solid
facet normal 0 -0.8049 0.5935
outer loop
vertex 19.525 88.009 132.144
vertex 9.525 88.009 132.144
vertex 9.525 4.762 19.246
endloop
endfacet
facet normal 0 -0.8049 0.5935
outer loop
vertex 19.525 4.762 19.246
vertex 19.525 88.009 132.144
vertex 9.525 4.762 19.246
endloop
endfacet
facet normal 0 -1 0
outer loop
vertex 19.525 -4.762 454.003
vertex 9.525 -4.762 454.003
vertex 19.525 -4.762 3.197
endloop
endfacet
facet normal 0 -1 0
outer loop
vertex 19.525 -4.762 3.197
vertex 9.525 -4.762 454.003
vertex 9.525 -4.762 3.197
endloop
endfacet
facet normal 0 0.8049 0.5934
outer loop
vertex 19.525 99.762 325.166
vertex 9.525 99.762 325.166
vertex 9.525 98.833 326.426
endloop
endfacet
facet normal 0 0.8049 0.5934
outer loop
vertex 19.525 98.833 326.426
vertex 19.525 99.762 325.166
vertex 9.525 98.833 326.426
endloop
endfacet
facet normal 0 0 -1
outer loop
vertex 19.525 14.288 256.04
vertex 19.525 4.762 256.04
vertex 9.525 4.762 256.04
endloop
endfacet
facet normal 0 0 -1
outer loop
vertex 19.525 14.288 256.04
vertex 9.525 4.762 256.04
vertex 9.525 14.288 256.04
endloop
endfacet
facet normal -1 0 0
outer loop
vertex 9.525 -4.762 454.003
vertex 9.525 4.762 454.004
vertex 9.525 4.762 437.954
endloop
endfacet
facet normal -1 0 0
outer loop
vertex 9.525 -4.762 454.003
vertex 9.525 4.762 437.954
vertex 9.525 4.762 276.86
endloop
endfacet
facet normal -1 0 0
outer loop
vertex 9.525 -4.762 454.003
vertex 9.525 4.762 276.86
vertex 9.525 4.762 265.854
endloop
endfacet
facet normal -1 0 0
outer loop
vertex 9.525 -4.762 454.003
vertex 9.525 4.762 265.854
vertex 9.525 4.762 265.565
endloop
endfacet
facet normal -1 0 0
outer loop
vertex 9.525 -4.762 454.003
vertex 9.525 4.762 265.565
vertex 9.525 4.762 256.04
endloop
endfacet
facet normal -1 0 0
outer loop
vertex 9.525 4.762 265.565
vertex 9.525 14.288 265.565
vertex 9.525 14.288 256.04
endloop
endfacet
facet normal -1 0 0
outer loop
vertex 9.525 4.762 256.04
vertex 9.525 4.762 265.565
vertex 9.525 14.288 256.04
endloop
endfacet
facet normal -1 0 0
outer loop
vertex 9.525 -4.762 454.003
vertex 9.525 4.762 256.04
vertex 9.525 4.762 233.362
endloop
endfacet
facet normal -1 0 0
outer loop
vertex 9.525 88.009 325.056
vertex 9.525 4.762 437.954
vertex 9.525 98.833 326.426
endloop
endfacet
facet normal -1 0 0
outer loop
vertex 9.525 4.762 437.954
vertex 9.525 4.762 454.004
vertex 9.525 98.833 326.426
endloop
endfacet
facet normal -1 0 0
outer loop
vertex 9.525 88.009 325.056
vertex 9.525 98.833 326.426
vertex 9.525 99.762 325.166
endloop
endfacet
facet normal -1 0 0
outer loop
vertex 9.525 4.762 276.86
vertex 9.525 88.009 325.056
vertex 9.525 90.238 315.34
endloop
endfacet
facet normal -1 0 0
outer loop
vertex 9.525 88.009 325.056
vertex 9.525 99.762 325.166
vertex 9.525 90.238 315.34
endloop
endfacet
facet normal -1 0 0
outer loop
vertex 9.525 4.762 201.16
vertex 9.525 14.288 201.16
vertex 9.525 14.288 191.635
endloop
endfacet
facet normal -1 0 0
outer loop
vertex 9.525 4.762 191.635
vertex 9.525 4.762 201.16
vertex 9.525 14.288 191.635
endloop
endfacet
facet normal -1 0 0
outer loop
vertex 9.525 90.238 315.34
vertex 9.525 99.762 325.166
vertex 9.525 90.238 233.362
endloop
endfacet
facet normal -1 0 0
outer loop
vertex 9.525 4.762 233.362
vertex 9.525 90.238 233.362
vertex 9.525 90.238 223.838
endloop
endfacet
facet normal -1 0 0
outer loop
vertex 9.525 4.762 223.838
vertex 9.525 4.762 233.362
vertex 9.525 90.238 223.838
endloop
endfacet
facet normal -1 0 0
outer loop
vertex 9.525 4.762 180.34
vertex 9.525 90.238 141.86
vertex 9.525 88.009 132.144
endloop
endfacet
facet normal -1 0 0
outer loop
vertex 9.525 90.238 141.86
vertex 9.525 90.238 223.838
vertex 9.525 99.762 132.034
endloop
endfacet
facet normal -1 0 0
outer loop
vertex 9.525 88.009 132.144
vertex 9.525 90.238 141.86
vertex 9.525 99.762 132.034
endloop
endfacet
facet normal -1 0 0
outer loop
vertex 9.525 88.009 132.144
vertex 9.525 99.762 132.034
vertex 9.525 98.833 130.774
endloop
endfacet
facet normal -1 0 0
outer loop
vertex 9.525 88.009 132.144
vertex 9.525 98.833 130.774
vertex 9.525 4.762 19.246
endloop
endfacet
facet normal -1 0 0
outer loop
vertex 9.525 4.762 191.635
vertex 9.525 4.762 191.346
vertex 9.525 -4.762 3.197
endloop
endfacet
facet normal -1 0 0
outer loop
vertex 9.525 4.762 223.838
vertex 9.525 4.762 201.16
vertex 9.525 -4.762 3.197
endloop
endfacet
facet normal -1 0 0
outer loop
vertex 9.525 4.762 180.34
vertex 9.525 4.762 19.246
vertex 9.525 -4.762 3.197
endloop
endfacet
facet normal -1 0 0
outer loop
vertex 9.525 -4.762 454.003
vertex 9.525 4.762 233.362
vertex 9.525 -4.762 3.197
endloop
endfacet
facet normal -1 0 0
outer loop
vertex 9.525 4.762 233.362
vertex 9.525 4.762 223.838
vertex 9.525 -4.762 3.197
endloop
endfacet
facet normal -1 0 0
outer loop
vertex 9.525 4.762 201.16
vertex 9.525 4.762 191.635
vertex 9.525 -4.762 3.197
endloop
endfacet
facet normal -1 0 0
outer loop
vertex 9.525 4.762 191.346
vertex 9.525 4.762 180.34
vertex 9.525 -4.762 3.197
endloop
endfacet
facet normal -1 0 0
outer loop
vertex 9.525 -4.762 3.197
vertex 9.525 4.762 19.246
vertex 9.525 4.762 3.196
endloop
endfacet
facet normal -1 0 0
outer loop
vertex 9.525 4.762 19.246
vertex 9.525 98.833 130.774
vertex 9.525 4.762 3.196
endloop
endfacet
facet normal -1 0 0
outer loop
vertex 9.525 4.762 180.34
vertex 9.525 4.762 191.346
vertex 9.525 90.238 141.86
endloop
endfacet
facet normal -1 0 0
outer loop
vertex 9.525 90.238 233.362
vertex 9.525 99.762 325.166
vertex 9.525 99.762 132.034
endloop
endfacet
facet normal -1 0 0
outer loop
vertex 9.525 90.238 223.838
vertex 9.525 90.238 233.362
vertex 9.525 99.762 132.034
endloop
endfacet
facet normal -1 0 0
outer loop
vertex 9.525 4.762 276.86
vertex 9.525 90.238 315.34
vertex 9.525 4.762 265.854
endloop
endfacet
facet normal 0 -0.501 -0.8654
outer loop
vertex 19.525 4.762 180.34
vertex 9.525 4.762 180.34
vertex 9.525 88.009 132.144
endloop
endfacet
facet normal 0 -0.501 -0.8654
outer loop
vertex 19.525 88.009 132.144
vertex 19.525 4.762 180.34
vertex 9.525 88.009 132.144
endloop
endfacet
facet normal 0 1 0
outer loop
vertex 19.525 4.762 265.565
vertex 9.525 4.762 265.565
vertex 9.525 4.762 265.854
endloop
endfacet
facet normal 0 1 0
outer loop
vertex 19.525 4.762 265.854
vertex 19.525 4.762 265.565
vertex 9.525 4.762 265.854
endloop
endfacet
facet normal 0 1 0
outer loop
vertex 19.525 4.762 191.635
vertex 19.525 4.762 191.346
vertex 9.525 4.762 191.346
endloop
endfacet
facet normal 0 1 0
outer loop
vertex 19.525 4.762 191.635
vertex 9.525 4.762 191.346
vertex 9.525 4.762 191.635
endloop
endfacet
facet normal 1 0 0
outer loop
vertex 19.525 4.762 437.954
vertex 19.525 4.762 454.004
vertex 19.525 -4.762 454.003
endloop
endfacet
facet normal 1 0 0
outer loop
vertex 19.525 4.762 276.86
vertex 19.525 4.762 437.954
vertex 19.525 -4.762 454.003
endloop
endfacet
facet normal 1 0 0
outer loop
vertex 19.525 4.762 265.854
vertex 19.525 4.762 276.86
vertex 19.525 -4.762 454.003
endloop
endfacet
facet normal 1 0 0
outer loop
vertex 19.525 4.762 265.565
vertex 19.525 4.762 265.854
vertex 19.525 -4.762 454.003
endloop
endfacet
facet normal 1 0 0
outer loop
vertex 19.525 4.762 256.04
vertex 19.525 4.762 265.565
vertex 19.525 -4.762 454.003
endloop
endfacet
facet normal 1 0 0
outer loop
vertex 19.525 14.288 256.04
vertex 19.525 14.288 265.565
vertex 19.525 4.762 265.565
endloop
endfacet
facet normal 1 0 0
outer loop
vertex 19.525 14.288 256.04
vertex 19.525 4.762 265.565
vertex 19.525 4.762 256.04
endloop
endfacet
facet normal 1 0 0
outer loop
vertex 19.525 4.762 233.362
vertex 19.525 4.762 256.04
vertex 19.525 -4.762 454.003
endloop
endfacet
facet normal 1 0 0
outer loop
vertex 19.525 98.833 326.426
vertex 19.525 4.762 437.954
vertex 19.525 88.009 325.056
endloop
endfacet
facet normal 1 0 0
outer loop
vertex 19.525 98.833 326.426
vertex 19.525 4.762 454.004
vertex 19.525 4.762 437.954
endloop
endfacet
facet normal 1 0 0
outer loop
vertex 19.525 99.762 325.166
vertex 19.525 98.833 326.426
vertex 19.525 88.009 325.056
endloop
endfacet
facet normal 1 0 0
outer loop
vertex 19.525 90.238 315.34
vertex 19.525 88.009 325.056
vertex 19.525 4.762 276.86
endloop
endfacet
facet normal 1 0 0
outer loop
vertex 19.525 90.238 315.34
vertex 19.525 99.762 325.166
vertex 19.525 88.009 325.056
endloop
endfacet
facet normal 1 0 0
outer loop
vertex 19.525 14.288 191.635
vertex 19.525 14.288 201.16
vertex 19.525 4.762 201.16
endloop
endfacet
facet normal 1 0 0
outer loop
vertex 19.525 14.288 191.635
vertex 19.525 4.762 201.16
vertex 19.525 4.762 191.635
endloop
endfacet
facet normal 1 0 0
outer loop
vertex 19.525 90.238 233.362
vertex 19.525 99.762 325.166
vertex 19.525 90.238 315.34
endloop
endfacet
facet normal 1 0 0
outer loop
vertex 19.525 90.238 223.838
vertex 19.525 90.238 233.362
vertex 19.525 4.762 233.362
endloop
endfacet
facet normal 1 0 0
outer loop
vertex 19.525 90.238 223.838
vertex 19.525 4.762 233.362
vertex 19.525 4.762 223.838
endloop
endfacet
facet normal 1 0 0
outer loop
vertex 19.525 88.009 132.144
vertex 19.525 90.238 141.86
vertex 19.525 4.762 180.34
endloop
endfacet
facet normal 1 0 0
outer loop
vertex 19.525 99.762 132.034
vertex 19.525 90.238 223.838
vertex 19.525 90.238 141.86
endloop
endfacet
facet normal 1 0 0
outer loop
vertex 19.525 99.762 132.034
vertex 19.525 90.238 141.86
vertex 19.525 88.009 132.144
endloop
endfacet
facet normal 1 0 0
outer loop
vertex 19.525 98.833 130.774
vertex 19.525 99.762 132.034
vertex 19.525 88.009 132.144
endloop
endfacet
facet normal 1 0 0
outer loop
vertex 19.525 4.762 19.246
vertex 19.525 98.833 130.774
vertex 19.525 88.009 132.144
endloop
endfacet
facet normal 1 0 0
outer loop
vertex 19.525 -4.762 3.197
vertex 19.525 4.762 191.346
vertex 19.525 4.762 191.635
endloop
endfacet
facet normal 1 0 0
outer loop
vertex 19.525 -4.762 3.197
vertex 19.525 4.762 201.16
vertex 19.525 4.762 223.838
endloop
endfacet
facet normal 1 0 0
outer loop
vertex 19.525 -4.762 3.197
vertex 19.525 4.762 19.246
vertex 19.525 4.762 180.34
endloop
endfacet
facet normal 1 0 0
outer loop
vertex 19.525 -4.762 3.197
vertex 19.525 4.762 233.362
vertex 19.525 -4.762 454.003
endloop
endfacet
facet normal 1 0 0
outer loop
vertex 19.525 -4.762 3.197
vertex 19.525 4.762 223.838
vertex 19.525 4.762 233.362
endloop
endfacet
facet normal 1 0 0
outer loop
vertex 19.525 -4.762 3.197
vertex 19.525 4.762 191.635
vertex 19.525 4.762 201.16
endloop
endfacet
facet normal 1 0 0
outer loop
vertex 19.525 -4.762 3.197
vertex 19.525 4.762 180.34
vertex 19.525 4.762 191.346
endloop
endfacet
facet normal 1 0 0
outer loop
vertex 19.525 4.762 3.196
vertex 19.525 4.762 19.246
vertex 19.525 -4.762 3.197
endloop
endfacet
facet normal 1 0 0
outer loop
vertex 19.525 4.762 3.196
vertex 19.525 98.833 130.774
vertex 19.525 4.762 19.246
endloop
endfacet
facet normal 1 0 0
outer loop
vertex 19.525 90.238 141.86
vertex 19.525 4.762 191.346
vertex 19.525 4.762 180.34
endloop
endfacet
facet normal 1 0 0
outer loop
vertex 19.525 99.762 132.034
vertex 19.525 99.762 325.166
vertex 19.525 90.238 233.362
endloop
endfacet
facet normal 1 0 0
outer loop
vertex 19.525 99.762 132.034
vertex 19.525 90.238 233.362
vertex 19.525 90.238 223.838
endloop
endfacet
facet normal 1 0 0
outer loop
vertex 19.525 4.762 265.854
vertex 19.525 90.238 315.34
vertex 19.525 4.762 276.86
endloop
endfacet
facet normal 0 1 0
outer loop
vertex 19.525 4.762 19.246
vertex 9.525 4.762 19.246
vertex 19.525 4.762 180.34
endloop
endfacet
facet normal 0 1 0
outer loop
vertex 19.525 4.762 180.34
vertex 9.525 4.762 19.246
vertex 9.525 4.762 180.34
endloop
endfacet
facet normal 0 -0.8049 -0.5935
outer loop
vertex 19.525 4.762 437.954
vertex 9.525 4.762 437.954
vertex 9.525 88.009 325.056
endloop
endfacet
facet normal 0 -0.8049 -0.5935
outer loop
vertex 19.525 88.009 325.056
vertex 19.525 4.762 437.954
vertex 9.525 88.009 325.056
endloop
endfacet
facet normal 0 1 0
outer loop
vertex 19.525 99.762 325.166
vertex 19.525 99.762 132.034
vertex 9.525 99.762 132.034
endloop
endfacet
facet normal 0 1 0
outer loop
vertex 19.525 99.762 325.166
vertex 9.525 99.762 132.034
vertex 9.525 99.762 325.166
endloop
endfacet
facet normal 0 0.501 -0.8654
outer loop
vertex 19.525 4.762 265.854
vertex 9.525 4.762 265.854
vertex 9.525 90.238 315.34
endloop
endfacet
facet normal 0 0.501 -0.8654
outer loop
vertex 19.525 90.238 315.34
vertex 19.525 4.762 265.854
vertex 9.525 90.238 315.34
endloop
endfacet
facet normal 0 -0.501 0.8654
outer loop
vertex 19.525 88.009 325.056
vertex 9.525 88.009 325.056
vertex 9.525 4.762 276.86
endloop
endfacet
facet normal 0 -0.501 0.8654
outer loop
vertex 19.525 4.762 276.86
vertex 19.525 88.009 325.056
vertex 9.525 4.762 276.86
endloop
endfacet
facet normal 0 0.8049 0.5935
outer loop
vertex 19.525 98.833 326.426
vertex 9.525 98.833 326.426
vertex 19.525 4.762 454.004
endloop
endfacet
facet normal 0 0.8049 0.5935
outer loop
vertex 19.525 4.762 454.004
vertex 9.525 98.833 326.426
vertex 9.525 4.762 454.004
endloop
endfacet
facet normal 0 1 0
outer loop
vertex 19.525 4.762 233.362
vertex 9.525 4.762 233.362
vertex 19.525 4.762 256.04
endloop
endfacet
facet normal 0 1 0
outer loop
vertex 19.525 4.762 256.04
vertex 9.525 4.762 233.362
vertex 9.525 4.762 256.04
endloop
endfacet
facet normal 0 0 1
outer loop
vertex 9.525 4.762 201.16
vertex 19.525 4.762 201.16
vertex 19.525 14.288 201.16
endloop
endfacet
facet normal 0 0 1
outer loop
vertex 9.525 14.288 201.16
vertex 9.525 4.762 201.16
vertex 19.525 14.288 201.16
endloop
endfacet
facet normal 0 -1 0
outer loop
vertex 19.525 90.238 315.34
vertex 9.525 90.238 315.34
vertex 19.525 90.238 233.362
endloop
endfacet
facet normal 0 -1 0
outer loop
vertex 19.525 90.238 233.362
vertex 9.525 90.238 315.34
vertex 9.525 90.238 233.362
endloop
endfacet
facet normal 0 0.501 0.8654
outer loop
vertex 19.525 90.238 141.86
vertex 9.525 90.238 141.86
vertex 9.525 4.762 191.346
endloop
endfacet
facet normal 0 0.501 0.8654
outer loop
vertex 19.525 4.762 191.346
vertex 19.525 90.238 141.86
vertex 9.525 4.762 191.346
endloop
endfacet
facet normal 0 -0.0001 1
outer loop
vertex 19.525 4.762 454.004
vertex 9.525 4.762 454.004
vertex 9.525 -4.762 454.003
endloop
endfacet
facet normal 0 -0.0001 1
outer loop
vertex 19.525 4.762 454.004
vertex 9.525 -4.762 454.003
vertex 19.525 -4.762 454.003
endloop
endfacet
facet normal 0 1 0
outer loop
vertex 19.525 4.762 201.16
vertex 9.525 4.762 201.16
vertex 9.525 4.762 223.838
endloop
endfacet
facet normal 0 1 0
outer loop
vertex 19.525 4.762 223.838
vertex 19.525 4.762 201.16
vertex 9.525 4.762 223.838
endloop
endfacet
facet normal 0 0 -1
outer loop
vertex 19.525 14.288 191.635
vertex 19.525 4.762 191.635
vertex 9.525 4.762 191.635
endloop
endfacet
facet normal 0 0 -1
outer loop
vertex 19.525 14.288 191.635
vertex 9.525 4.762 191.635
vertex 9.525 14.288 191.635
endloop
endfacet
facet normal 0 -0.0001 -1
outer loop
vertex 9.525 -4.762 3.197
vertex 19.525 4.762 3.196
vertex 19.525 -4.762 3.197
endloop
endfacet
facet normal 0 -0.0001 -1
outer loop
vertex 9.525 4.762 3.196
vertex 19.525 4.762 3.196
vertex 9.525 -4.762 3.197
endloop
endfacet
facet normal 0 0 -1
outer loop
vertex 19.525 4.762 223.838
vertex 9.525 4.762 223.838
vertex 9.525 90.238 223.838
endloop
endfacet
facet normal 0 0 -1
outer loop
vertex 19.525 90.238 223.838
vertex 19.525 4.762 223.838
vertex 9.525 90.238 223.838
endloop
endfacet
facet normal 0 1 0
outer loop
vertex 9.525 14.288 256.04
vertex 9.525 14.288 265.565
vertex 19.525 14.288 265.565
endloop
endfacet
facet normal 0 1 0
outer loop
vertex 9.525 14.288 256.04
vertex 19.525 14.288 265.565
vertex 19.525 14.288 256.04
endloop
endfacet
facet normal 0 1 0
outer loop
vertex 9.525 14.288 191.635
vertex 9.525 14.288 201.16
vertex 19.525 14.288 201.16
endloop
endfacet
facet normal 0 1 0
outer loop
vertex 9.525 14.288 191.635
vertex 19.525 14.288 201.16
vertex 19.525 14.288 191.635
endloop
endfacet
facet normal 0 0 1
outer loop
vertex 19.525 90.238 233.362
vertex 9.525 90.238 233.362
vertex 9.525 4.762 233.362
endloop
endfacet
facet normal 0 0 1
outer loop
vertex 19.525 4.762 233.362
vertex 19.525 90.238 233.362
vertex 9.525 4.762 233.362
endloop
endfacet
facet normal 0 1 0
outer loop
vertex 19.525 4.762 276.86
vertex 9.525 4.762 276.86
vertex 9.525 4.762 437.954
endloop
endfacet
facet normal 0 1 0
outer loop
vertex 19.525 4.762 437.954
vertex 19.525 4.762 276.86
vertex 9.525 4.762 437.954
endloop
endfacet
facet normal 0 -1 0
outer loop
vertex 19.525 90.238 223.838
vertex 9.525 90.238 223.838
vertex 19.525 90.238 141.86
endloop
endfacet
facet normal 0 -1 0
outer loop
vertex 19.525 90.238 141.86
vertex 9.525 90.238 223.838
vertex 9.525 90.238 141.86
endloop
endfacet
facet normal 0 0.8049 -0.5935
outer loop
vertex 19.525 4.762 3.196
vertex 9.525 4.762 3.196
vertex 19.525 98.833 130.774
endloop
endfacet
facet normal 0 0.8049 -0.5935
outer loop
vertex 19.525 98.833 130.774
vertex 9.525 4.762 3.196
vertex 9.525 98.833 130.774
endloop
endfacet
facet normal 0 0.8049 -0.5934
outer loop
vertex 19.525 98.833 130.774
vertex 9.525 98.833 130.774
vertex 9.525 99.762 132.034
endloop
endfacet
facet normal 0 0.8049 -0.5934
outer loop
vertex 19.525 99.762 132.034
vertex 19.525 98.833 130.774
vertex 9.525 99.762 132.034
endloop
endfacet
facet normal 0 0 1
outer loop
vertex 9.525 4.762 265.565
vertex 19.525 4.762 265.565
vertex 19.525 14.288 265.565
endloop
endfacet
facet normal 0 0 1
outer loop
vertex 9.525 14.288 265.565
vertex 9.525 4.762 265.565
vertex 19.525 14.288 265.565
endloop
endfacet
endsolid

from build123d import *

# Parameters (mm, degrees)
EXTRUDE_THIN1_DEPTH = 10
SKETCH3_W           = 9.525
SKETCH3_H           = 9.525
BOSS_EXTRUDE1_DEPTH = 10
SKETCH4_W           = 25.457542158
SKETCH4_H           = 16.944951572
CUT_EXTRUDE1_DEPTH  = 12.917655
SKETCH5_W           = 71.291664715
SKETCH5_H           = 18.17592298
CUT_EXTRUDE2_DEPTH  = 12.917655


# Read off the part's stored shape, not the designer's step: Extrude-Thin1
with BuildPart() as part:
    # Extrude-Thin1 outline → Extrude-Thin1 (new body)
    with BuildSketch(Plane(origin=(9.525, 0, 0), x_dir=(0, 0, -1), z_dir=(1, 0, 0))):
        Polygon((-323.6, 99.7625), (-323.6, 95), (-326.426404213, 98.833124766), (-466.921154801, -4.7625), (9.721154801, -4.7625), (-130.773595787, 98.833124766), (-133.6, 95), (-133.6, 99.7625), align=None)
        Polygon((-276.860305191, 4.7625), (-437.953845199, 4.7625), (-325.055829502, 88.009314718), align=None, mode=Mode.SUBTRACT)
        Polygon((-180.339694809, 4.7625), (-132.144170498, 88.009314718), (-19.246154801, 4.7625), align=None, mode=Mode.SUBTRACT)
        Polygon((-315.339694809, 90.2375), (-233.3625, 90.2375), (-233.3625, 4.7625), (-265.854168493, 4.7625), align=None, mode=Mode.SUBTRACT)
        Polygon((-223.8375, 90.2375), (-141.860305191, 90.2375), (-191.345831507, 4.7625), (-223.8375, 4.7625), align=None, mode=Mode.SUBTRACT)
    extrude(amount=EXTRUDE_THIN1_DEPTH)

    # Sketch3 → Boss-Extrude1 (add)
    with BuildSketch(Plane(origin=(19.525, 0, 0), x_dir=(0, 0, -1), z_dir=(1, 0, 0))):
        Polygon((-133.6, 99.7625), (-133.6, 95), (-130.773595787, 98.833124766), (-132.033999804, 99.7625), align=None)
        Polygon((-326.426404213, 98.833124766), (-323.6, 95), (-323.6, 99.7625), (-325.166000196, 99.7625), align=None)
        Polygon((9.721154801, 4.7625), (-3.196499804, 4.7625), (9.721154801, -4.7625), align=None)
        Polygon((-466.921154801, -4.7625), (-454.003500196, 4.7625), (-466.921154801, 4.7625), align=None)
        with Locations((-260.802793514, 9.525)):
            Rectangle(SKETCH3_W, SKETCH3_H)
        with Locations((-196.397206486, 9.525)):
            Rectangle(SKETCH3_W, SKETCH3_H)
    extrude(amount=-BOSS_EXTRUDE1_DEPTH)

    # Sketch4 → Cut-Extrude1 (cut)
    with BuildSketch(Plane(origin=(0, 0, -9.721154801), x_dir=(-1, 0, 0), z_dir=(0, 0, -1))):
        with Locations((-19.165581616, -1.578540654)):
            Rectangle(SKETCH4_W, SKETCH4_H)
    extrude(amount=-CUT_EXTRUDE1_DEPTH, mode=Mode.SUBTRACT)

    # Sketch5 → Cut-Extrude2 (cut)
    with BuildSketch(Plane.XY.offset(466.921154801)):
        with Locations((18.052286902, -0.452774422)):
            Rectangle(SKETCH5_W, SKETCH5_H)
    extrude(amount=-CUT_EXTRUDE2_DEPTH, mode=Mode.SUBTRACT)


solid = part.part
